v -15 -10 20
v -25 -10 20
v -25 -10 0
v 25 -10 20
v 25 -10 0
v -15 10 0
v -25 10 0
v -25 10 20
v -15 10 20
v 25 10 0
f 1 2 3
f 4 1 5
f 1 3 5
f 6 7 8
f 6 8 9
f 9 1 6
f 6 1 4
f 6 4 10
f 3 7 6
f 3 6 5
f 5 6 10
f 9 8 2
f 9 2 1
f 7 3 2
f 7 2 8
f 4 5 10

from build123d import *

# Parameters (mm, degrees)
F0_W     = 50
F0_H     = 20
F1_DEPTH = 20
F3_DEPTH = 40


with BuildPart() as f1:
    # F0 (on Top) → F1 (new body)
    with BuildSketch(Plane.XY):
        Rectangle(F0_W, F0_H)
    extrude(amount=F1_DEPTH)

    # F2 (on face) → F3 (cut)
    with BuildSketch(Plane.YZ.offset(25)):
        Polygon((10, 20), (-10, 20), (10, 0), align=None)
    extrude(amount=-F3_DEPTH, mode=Mode.SUBTRACT)


solid = f1.part
